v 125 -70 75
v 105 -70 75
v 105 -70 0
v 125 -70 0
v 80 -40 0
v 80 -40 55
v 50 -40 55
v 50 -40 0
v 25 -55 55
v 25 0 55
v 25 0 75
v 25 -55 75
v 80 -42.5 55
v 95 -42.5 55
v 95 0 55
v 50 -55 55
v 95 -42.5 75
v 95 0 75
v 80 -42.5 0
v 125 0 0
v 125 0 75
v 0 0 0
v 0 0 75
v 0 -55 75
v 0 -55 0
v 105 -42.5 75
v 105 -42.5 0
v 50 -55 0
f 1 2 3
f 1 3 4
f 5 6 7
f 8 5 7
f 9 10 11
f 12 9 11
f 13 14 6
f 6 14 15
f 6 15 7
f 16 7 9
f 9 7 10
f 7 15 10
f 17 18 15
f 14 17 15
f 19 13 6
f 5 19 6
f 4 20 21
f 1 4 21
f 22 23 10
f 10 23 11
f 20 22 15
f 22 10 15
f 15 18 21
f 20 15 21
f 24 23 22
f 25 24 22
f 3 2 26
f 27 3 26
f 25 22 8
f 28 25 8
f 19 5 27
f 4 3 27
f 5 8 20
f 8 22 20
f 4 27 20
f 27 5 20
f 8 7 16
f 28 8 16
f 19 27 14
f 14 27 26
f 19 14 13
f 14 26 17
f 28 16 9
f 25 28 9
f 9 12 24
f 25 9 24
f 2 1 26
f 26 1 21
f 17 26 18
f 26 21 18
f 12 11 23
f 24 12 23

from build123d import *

# Parameters (mm, degrees)
F1_DEPTH = 70
F4_DEPTH = 75.001


with BuildPart() as f1:
    # F0 (on Front) → F1 (new body)
    with BuildSketch(Plane.XZ):
        Polygon((0, 75), (0, 0), (125, 0), (125, 75), (95, 75), (95, 55), (25, 55), (25, 75), align=None)
    extrude(amount=F1_DEPTH)

    # F3 (on offset) → F4 (cut, through all)
    with BuildSketch(Plane.XY.offset(75)):
        Polygon((50, -55), (0, -55), (0, -70), (105, -70), (105, -42.5), (80, -42.5), (80, -40), (50, -40), align=None)
    extrude(amount=-F4_DEPTH, mode=Mode.SUBTRACT)


solid = f1.part
